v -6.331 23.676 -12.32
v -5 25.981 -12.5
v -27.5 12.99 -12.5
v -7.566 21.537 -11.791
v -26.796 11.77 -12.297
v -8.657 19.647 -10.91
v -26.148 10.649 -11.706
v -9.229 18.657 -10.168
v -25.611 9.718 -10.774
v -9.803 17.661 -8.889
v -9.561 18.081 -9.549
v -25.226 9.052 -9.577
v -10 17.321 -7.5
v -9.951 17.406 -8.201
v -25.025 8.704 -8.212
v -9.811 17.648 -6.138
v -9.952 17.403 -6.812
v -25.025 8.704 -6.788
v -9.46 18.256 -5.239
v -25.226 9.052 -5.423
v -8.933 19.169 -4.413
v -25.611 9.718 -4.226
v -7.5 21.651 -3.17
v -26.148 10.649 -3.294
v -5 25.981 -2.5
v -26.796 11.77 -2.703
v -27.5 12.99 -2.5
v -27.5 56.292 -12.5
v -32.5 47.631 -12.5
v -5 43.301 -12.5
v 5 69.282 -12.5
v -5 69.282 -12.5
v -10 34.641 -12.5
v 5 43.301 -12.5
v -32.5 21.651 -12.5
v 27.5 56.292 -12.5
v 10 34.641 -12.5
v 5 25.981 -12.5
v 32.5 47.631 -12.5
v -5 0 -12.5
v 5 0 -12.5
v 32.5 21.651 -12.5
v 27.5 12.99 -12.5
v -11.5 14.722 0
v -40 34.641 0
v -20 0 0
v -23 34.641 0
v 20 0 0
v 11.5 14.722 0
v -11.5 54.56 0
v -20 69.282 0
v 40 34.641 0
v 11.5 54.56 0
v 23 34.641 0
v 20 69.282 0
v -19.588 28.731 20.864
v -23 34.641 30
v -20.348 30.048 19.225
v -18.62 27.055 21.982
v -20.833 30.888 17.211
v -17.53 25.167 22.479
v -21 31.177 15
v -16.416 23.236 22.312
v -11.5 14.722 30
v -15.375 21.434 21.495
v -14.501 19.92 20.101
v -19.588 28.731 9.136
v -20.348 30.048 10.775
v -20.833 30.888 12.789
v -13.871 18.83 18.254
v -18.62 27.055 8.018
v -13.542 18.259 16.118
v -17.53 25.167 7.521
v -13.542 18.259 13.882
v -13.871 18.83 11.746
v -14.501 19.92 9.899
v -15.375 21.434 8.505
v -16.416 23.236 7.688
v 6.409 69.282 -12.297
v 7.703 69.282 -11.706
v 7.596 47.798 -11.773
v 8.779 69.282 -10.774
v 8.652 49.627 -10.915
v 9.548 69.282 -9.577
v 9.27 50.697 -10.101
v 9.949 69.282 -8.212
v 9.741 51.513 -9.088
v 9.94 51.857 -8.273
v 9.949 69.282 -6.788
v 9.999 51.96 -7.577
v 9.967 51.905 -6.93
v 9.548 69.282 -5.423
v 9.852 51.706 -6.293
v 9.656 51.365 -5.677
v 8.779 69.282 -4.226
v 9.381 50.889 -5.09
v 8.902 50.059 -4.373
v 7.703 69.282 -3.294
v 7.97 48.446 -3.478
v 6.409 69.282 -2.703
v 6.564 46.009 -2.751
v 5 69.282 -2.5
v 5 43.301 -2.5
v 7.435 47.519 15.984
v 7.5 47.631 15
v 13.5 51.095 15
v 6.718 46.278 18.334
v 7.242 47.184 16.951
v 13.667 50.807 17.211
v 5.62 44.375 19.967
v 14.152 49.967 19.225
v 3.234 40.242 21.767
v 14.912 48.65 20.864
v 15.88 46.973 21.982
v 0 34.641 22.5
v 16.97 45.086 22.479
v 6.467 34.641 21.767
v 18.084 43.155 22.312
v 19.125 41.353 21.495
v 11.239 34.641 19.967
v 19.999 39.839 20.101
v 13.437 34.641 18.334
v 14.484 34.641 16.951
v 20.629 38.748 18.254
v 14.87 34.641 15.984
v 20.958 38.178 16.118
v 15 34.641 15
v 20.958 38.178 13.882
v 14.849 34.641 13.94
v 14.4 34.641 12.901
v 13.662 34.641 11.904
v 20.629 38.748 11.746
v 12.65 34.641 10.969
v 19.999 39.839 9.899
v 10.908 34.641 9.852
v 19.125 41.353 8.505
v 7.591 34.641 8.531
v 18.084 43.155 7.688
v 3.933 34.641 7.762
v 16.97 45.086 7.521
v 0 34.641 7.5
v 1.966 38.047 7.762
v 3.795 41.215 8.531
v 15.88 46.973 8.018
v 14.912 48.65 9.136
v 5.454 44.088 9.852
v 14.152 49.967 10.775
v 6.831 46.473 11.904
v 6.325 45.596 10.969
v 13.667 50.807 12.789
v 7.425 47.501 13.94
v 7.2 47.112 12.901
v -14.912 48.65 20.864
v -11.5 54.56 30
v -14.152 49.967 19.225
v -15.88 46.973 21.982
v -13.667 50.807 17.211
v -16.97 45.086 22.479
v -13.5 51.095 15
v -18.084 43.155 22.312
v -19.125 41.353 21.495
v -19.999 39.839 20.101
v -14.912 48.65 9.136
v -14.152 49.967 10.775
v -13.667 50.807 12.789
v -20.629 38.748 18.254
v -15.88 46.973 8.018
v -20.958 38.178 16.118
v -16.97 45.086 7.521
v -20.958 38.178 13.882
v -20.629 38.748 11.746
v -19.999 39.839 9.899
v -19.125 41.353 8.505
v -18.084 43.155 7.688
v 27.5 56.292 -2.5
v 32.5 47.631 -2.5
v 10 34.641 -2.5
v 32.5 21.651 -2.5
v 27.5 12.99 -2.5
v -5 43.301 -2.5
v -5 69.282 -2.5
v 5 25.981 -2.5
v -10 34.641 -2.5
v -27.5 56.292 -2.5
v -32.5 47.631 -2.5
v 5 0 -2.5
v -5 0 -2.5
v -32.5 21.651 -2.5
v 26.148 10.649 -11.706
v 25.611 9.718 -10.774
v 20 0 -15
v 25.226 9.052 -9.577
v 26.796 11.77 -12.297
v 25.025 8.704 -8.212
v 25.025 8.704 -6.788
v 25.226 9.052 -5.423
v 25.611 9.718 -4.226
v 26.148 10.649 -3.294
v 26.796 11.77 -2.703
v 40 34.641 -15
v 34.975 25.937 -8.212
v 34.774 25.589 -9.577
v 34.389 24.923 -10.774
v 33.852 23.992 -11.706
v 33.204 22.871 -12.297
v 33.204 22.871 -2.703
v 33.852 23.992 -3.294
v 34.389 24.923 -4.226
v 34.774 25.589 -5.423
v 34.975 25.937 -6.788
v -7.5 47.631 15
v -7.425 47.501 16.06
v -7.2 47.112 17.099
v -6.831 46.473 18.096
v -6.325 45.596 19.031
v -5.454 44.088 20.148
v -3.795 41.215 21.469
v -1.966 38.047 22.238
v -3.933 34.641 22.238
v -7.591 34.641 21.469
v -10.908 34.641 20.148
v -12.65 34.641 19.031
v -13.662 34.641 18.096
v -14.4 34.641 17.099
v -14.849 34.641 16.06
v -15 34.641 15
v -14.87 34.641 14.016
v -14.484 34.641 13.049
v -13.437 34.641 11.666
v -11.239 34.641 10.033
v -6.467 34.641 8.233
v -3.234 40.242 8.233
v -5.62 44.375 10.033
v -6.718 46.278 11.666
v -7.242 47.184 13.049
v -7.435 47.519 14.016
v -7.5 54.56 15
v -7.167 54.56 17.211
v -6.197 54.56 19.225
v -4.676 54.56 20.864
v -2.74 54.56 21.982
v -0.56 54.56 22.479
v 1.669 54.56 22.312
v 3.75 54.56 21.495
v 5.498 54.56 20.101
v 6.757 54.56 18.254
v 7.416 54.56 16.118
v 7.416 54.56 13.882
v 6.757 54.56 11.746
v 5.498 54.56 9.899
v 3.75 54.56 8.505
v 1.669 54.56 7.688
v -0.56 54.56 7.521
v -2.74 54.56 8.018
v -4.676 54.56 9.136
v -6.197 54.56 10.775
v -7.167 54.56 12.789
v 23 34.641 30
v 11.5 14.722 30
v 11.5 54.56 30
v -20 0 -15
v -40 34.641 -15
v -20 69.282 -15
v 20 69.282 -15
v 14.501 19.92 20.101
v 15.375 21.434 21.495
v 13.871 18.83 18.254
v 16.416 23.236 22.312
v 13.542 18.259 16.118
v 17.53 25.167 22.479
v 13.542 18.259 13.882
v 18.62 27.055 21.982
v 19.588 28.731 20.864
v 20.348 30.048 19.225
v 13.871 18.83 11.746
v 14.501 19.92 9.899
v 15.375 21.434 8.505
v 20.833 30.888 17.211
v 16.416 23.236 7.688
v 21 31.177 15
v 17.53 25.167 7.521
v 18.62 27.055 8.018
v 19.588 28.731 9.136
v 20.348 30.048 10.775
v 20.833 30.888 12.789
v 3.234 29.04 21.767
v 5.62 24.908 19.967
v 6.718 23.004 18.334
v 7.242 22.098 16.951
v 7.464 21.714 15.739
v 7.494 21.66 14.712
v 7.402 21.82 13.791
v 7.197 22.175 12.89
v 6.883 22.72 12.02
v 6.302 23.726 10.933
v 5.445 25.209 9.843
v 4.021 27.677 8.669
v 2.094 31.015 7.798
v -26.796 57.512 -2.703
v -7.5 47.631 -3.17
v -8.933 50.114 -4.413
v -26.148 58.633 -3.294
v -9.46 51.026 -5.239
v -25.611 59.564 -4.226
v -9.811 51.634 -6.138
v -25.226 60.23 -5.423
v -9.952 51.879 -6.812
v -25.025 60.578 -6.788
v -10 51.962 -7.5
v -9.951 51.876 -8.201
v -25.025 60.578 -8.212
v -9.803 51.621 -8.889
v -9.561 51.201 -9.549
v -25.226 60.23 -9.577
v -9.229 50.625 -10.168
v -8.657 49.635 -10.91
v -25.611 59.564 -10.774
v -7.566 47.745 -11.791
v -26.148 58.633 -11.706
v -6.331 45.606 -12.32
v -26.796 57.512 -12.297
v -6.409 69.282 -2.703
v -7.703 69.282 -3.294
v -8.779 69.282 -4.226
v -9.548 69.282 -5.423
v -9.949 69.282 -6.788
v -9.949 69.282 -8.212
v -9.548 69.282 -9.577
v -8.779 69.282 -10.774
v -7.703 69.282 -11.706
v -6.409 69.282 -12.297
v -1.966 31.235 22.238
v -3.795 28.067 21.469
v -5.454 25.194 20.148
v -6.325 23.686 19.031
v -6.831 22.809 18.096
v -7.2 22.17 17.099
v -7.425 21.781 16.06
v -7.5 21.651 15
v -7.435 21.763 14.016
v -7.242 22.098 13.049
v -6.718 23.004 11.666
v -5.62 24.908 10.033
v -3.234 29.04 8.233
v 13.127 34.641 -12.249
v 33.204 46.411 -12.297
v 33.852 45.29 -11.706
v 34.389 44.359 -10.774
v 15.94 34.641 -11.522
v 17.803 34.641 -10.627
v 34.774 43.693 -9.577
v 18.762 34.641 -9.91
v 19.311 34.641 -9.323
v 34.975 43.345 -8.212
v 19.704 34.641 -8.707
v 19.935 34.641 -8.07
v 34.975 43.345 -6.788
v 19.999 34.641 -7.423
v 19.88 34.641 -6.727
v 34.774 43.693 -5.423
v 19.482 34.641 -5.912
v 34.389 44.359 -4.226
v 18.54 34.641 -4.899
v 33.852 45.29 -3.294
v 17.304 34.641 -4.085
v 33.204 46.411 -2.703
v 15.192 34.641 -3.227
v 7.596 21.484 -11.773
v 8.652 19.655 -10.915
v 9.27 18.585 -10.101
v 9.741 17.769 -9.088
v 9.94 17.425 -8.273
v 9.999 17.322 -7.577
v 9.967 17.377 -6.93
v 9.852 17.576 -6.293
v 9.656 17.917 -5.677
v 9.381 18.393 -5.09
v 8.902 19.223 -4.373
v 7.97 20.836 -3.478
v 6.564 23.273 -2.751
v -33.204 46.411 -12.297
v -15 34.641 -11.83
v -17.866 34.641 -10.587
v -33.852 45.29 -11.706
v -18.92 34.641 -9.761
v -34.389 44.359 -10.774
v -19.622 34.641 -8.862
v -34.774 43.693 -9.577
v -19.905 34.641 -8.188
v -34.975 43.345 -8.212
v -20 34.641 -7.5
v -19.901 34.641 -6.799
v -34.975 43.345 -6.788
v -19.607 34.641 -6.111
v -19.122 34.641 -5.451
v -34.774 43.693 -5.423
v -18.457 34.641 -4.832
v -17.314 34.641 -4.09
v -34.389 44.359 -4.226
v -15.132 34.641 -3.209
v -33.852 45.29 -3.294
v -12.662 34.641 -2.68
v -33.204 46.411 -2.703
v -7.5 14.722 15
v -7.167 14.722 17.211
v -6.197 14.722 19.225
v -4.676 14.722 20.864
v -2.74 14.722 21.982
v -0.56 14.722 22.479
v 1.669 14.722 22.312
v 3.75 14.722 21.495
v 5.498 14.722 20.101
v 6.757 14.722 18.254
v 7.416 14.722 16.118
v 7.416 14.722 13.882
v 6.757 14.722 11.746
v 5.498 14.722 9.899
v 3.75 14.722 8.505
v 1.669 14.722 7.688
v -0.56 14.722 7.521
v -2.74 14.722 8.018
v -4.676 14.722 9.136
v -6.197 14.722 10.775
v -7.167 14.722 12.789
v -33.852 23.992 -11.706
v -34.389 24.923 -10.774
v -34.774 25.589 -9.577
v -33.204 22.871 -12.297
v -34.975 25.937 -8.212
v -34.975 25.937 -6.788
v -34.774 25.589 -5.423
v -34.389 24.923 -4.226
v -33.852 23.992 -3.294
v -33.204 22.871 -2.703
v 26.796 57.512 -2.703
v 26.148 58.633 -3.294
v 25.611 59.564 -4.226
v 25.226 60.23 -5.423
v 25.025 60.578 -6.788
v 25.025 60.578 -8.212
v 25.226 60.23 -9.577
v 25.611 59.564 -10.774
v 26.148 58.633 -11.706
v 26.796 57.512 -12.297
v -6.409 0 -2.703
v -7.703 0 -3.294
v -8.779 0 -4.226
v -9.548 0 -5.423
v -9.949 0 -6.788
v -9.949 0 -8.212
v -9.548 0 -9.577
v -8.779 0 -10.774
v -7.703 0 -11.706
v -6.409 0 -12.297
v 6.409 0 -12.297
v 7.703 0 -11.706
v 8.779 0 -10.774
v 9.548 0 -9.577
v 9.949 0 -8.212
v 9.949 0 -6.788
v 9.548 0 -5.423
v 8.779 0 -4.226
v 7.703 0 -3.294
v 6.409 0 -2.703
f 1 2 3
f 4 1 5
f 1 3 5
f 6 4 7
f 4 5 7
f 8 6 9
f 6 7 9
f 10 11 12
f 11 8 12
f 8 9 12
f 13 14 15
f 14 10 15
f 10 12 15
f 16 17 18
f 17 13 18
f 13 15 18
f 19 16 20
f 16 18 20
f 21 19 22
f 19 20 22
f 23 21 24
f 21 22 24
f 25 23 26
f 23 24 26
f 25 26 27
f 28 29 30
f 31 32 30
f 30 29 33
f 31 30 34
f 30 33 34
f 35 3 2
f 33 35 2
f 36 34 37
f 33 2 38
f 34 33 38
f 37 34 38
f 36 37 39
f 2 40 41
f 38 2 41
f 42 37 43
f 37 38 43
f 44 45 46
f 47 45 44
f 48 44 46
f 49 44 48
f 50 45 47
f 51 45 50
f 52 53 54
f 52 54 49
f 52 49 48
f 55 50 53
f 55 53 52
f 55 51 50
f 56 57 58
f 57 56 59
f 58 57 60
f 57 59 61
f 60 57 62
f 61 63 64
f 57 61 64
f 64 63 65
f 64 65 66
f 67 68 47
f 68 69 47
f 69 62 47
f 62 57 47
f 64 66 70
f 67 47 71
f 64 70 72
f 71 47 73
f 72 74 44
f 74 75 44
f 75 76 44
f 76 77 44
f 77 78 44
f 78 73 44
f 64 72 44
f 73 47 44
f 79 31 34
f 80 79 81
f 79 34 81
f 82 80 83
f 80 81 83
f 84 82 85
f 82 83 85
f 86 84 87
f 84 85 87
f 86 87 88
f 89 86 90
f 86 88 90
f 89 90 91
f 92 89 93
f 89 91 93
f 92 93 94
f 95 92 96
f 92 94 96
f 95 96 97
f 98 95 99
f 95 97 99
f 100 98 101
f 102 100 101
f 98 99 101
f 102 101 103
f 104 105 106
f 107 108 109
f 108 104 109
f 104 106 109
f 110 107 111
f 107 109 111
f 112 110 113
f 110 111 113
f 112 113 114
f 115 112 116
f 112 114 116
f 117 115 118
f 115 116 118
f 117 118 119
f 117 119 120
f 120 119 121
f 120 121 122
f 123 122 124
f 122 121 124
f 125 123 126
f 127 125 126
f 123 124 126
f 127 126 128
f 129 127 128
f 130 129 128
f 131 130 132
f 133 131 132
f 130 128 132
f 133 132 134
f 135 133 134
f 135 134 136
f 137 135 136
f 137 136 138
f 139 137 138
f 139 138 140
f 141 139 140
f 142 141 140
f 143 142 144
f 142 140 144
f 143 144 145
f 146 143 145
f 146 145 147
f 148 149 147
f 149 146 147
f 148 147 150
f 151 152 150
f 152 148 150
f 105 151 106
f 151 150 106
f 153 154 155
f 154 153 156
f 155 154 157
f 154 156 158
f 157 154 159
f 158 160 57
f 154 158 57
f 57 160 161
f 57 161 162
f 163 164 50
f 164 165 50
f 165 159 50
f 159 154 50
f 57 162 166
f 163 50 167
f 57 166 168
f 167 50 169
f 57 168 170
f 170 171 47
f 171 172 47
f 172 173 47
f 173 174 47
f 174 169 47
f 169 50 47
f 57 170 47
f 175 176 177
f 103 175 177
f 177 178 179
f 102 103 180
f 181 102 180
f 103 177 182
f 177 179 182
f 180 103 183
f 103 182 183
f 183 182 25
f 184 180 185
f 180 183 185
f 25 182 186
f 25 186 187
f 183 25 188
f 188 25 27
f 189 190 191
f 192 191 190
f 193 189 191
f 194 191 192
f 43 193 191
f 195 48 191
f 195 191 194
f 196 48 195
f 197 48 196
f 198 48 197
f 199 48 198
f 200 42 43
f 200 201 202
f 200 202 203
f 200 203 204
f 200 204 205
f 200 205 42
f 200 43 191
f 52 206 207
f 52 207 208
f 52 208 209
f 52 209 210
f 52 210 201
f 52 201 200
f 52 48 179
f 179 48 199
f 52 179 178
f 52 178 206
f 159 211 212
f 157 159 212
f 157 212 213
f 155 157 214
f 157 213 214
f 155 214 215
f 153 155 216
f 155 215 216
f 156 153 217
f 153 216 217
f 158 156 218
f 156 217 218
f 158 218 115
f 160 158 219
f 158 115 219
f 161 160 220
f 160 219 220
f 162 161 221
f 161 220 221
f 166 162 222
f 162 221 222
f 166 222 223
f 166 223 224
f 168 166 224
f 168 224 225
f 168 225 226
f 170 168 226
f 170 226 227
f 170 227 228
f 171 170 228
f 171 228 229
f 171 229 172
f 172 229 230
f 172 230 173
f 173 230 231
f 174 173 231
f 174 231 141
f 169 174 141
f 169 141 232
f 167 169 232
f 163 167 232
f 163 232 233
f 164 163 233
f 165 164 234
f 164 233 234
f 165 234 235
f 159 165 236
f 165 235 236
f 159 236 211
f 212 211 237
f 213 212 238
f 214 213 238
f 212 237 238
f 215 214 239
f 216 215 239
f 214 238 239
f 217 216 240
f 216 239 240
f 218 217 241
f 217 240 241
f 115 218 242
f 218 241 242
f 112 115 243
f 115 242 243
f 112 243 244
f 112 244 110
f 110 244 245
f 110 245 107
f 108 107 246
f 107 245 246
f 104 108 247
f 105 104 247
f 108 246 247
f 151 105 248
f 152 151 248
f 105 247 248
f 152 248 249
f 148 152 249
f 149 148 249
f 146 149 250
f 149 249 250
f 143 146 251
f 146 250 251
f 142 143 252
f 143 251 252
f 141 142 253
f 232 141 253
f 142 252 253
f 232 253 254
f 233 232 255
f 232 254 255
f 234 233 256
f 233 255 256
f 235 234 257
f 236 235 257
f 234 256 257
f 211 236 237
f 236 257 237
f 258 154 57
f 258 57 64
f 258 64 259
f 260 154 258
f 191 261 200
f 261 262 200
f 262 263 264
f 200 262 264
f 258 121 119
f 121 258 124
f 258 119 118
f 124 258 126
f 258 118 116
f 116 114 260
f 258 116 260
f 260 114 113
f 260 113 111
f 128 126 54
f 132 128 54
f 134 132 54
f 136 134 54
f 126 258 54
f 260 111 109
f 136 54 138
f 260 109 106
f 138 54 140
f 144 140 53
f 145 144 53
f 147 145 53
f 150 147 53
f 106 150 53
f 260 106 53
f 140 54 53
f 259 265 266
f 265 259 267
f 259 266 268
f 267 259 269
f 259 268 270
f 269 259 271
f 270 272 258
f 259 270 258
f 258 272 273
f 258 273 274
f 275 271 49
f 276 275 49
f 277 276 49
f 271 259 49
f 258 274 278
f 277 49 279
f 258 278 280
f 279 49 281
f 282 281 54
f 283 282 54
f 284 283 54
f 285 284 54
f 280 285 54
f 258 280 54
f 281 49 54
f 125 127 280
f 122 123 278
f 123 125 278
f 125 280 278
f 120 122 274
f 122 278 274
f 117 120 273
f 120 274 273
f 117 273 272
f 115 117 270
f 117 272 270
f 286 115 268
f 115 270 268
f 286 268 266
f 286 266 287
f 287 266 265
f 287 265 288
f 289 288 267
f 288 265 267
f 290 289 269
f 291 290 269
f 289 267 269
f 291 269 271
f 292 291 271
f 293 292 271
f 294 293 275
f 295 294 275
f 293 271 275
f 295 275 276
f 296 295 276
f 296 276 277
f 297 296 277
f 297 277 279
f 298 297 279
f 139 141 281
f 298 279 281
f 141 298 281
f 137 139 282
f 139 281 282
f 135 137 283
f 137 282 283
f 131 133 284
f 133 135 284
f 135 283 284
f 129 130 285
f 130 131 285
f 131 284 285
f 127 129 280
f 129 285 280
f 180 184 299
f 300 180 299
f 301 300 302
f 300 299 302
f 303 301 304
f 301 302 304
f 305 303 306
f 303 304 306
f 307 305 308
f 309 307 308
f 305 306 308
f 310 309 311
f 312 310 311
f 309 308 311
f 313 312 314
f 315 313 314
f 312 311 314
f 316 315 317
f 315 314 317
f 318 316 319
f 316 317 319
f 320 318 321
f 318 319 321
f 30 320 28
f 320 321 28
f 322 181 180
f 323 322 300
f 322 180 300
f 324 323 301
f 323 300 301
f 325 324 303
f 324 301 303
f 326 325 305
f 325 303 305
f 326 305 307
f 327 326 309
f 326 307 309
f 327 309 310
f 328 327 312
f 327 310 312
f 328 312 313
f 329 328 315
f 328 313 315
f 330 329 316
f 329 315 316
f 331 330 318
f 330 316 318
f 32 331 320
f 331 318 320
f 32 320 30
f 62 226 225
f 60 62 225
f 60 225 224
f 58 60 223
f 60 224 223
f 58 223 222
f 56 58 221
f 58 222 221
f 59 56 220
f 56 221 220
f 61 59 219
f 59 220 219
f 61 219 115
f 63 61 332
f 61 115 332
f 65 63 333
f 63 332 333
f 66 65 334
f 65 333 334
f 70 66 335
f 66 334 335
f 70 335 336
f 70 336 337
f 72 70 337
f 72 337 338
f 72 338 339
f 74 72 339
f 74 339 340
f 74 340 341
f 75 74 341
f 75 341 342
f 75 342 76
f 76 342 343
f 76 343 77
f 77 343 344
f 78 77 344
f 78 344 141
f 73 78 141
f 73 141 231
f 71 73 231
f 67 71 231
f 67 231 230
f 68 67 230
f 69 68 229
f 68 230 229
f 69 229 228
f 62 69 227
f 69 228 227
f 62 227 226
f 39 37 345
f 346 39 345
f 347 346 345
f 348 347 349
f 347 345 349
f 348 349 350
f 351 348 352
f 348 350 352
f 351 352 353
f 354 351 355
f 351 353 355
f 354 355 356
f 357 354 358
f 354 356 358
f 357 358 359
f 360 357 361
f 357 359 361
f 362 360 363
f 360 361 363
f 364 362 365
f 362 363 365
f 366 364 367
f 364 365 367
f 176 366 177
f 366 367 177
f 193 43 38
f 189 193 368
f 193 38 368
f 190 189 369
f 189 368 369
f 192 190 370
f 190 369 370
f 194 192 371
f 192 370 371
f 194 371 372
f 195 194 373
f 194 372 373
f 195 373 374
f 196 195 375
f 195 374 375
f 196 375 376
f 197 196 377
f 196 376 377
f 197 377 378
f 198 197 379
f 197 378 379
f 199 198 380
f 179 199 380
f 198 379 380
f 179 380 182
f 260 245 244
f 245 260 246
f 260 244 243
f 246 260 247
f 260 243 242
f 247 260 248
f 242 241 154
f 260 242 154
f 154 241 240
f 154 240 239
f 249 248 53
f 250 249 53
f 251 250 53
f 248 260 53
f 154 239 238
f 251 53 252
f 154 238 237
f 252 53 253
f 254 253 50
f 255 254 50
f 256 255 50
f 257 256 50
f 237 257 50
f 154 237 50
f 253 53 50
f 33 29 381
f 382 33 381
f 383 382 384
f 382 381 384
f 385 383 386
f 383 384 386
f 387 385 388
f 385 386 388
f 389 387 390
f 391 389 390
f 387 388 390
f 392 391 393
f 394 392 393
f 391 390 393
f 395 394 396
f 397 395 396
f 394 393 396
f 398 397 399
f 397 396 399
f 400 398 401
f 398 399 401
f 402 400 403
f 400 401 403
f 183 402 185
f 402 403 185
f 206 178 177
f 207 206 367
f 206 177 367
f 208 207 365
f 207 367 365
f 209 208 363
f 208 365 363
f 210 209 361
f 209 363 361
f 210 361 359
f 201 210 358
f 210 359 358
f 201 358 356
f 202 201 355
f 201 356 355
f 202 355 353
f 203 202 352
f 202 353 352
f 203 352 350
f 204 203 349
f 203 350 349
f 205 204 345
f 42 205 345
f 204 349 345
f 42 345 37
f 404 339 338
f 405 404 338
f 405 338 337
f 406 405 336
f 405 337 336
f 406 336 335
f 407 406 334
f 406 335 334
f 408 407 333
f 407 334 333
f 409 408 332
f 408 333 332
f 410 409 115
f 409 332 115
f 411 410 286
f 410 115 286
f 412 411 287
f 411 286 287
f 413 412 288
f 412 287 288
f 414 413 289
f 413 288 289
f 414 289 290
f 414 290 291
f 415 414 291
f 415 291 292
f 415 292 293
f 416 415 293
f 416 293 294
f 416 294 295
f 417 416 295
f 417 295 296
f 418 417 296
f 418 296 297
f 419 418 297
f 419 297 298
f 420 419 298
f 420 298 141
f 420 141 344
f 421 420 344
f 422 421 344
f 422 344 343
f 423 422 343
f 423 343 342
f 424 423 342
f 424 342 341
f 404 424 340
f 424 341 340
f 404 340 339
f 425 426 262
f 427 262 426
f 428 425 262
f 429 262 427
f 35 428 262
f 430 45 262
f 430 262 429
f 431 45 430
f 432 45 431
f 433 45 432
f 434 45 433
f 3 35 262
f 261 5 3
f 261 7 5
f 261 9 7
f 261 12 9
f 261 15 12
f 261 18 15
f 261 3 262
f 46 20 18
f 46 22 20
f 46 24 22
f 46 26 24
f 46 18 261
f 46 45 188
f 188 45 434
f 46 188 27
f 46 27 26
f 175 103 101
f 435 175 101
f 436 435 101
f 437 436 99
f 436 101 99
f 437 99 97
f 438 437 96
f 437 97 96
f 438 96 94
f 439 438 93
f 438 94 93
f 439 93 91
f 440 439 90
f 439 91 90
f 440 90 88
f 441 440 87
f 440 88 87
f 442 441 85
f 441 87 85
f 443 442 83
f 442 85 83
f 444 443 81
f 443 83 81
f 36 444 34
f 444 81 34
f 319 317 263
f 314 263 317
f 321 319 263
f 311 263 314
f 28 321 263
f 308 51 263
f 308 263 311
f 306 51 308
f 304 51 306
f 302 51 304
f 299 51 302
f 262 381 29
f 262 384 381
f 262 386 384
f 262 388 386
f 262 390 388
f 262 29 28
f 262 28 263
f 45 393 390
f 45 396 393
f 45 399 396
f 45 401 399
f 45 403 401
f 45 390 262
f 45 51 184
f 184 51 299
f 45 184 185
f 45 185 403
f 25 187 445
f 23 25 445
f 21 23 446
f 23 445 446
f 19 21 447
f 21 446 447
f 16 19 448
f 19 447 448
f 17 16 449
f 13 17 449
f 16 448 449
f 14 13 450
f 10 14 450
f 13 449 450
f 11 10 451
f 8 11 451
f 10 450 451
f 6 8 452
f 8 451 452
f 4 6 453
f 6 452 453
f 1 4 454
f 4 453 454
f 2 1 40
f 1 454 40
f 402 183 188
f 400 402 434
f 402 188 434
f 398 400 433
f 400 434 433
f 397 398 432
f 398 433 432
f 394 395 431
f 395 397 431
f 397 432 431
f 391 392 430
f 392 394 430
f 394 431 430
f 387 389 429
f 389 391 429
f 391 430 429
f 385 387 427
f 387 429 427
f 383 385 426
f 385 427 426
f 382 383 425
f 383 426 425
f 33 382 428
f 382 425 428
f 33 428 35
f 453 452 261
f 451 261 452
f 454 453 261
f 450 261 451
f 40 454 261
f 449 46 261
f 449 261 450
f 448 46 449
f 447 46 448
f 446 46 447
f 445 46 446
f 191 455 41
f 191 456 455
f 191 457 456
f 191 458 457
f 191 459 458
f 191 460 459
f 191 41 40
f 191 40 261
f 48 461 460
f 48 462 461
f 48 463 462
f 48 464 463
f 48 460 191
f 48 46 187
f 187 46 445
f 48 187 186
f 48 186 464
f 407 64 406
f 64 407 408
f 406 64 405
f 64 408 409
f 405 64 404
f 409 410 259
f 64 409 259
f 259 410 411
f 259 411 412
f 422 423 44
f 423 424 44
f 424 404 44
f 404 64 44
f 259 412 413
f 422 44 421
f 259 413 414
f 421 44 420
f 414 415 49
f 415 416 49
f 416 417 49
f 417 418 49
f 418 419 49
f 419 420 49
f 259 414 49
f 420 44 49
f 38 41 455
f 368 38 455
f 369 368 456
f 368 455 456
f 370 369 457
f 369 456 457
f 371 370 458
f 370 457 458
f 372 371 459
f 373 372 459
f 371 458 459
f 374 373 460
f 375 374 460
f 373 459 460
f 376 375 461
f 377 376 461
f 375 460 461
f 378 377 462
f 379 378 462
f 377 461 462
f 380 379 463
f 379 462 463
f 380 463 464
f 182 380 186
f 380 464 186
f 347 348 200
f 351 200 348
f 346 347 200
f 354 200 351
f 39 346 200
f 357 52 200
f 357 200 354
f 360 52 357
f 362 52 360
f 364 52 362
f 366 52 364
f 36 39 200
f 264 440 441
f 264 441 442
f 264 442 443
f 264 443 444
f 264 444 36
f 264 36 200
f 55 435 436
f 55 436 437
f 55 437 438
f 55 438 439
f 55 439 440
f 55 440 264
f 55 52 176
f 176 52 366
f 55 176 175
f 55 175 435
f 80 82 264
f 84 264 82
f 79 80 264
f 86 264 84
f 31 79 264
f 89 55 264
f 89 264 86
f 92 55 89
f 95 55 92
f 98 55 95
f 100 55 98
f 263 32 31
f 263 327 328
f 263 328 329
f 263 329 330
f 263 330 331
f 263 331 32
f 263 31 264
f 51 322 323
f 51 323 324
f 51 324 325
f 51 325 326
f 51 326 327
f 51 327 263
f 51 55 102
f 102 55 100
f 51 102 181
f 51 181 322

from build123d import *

# Parameters (mm, degrees)
F1_DEPTH  = 15
F4_DEPTH  = 80
F6_DEPTH  = 80
F7_DEPTH  = 80
F9_DEPTH  = 30
F11_D     = 15
F11_DEPTH = 80
F11_TIP   = 4.5064546427
F14_D     = 15
F14_DEPTH = 80
F14_TIP   = 4.5064546427
F15_D     = 15
F15_DEPTH = 80
F15_TIP   = 4.5064546427


with BuildPart() as f1:
    # F0 (on Top) → F1 (new body)
    with BuildSketch(Plane.XY):
        Polygon((-20, 0), (0, 0), (20, 0), (40, 34.6410161514), (20, 69.2820323028), (0, 69.2820323028), (-20, 69.2820323028), (-40, 34.6410161514), align=None)
    extrude(amount=-F1_DEPTH)

    # F3 (on face) → F4 (cut)
    with BuildSketch(Plane(origin=(-45, 25.9807621135, 0), x_dir=(-0.5, -0.8660254038, 0), z_dir=(-0.8660254038, 0.5, 0))):
        with BuildLine():
            ThreePointArc((-25, -12.5), (-20, -7.5), (-25, -2.5))
            Line((-25, -2.5), (-35, -2.5))
            ThreePointArc((-35, -2.5), (-40, -7.5), (-35, -12.5))
            Line((-35, -12.5), (-25, -12.5))
        make_face()
    extrude(amount=-F4_DEPTH, mode=Mode.SUBTRACT)

    # F5 (on face) → F6 (cut)
    with BuildSketch(Plane.XZ):
        with BuildLine():
            ThreePointArc((5, -12.5), (10, -7.5), (5, -2.5))
            Line((5, -2.5), (-5, -2.5))
            ThreePointArc((-5, -2.5), (-10, -7.5), (-5, -12.5))
            Line((-5, -12.5), (5, -12.5))
        make_face()
    extrude(amount=-F6_DEPTH, mode=Mode.SUBTRACT)

    # F2 (on face) → F7 (cut)
    with BuildSketch(Plane(origin=(-15, -8.6602540378, 0), x_dir=(0.5, -0.8660254038, 0), z_dir=(-0.8660254038, -0.5, 0))):
        with BuildLine():
            ThreePointArc((-35, -2.5), (-40, -7.5), (-35, -12.5))
            Line((-35, -12.5), (-25, -12.5))
            ThreePointArc((-25, -12.5), (-20, -7.5), (-25, -2.5))
            Line((-25, -2.5), (-35, -2.5))
        make_face()
    extrude(amount=-F7_DEPTH, mode=Mode.SUBTRACT)

    # F8 (on face) → F9 (join)
    with BuildSketch(Plane.XY):
        Polygon((11.5, 54.5596004384), (-11.5, 54.5596004384), (-23, 34.6410161514), (-11.5, 14.7224318643), (11.5, 14.7224318643), (23, 34.6410161514), align=None)
    extrude(amount=F9_DEPTH)

    # F11
    with Locations(Plane.XZ.offset(-14.7224318643)):
        with Locations((0, 15)):
            Hole(F11_D / 2, depth=F11_DEPTH)
            with Locations((0, 0, -(F11_DEPTH + F11_TIP / 2))):  # 118° drill point
                Cone(0, F11_D / 2, F11_TIP, mode=Mode.SUBTRACT)

    # F14
    with Locations(Plane(origin=(-2.25, -1.2990381057, 0), x_dir=(0.5, -0.8660254038, 0), z_dir=(-0.8660254038, -0.5, 0))):
        with Locations((-30, 15)):
            Hole(F14_D / 2, depth=F14_DEPTH)
            with Locations((0, 0, -(F14_DEPTH + F14_TIP / 2))):  # 118° drill point
                Cone(0, F14_D / 2, F14_TIP, mode=Mode.SUBTRACT)

    # F15
    with Locations(Plane(origin=(-32.25, 18.6195461814, 0), x_dir=(-0.5, -0.8660254038, 0), z_dir=(-0.8660254038, 0.5, 0))):
        with Locations((-30, 15)):
            Hole(F15_D / 2, depth=F15_DEPTH)
            with Locations((0, 0, -(F15_DEPTH + F15_TIP / 2))):  # 118° drill point
                Cone(0, F15_D / 2, F15_TIP, mode=Mode.SUBTRACT)


solid = f1.part
